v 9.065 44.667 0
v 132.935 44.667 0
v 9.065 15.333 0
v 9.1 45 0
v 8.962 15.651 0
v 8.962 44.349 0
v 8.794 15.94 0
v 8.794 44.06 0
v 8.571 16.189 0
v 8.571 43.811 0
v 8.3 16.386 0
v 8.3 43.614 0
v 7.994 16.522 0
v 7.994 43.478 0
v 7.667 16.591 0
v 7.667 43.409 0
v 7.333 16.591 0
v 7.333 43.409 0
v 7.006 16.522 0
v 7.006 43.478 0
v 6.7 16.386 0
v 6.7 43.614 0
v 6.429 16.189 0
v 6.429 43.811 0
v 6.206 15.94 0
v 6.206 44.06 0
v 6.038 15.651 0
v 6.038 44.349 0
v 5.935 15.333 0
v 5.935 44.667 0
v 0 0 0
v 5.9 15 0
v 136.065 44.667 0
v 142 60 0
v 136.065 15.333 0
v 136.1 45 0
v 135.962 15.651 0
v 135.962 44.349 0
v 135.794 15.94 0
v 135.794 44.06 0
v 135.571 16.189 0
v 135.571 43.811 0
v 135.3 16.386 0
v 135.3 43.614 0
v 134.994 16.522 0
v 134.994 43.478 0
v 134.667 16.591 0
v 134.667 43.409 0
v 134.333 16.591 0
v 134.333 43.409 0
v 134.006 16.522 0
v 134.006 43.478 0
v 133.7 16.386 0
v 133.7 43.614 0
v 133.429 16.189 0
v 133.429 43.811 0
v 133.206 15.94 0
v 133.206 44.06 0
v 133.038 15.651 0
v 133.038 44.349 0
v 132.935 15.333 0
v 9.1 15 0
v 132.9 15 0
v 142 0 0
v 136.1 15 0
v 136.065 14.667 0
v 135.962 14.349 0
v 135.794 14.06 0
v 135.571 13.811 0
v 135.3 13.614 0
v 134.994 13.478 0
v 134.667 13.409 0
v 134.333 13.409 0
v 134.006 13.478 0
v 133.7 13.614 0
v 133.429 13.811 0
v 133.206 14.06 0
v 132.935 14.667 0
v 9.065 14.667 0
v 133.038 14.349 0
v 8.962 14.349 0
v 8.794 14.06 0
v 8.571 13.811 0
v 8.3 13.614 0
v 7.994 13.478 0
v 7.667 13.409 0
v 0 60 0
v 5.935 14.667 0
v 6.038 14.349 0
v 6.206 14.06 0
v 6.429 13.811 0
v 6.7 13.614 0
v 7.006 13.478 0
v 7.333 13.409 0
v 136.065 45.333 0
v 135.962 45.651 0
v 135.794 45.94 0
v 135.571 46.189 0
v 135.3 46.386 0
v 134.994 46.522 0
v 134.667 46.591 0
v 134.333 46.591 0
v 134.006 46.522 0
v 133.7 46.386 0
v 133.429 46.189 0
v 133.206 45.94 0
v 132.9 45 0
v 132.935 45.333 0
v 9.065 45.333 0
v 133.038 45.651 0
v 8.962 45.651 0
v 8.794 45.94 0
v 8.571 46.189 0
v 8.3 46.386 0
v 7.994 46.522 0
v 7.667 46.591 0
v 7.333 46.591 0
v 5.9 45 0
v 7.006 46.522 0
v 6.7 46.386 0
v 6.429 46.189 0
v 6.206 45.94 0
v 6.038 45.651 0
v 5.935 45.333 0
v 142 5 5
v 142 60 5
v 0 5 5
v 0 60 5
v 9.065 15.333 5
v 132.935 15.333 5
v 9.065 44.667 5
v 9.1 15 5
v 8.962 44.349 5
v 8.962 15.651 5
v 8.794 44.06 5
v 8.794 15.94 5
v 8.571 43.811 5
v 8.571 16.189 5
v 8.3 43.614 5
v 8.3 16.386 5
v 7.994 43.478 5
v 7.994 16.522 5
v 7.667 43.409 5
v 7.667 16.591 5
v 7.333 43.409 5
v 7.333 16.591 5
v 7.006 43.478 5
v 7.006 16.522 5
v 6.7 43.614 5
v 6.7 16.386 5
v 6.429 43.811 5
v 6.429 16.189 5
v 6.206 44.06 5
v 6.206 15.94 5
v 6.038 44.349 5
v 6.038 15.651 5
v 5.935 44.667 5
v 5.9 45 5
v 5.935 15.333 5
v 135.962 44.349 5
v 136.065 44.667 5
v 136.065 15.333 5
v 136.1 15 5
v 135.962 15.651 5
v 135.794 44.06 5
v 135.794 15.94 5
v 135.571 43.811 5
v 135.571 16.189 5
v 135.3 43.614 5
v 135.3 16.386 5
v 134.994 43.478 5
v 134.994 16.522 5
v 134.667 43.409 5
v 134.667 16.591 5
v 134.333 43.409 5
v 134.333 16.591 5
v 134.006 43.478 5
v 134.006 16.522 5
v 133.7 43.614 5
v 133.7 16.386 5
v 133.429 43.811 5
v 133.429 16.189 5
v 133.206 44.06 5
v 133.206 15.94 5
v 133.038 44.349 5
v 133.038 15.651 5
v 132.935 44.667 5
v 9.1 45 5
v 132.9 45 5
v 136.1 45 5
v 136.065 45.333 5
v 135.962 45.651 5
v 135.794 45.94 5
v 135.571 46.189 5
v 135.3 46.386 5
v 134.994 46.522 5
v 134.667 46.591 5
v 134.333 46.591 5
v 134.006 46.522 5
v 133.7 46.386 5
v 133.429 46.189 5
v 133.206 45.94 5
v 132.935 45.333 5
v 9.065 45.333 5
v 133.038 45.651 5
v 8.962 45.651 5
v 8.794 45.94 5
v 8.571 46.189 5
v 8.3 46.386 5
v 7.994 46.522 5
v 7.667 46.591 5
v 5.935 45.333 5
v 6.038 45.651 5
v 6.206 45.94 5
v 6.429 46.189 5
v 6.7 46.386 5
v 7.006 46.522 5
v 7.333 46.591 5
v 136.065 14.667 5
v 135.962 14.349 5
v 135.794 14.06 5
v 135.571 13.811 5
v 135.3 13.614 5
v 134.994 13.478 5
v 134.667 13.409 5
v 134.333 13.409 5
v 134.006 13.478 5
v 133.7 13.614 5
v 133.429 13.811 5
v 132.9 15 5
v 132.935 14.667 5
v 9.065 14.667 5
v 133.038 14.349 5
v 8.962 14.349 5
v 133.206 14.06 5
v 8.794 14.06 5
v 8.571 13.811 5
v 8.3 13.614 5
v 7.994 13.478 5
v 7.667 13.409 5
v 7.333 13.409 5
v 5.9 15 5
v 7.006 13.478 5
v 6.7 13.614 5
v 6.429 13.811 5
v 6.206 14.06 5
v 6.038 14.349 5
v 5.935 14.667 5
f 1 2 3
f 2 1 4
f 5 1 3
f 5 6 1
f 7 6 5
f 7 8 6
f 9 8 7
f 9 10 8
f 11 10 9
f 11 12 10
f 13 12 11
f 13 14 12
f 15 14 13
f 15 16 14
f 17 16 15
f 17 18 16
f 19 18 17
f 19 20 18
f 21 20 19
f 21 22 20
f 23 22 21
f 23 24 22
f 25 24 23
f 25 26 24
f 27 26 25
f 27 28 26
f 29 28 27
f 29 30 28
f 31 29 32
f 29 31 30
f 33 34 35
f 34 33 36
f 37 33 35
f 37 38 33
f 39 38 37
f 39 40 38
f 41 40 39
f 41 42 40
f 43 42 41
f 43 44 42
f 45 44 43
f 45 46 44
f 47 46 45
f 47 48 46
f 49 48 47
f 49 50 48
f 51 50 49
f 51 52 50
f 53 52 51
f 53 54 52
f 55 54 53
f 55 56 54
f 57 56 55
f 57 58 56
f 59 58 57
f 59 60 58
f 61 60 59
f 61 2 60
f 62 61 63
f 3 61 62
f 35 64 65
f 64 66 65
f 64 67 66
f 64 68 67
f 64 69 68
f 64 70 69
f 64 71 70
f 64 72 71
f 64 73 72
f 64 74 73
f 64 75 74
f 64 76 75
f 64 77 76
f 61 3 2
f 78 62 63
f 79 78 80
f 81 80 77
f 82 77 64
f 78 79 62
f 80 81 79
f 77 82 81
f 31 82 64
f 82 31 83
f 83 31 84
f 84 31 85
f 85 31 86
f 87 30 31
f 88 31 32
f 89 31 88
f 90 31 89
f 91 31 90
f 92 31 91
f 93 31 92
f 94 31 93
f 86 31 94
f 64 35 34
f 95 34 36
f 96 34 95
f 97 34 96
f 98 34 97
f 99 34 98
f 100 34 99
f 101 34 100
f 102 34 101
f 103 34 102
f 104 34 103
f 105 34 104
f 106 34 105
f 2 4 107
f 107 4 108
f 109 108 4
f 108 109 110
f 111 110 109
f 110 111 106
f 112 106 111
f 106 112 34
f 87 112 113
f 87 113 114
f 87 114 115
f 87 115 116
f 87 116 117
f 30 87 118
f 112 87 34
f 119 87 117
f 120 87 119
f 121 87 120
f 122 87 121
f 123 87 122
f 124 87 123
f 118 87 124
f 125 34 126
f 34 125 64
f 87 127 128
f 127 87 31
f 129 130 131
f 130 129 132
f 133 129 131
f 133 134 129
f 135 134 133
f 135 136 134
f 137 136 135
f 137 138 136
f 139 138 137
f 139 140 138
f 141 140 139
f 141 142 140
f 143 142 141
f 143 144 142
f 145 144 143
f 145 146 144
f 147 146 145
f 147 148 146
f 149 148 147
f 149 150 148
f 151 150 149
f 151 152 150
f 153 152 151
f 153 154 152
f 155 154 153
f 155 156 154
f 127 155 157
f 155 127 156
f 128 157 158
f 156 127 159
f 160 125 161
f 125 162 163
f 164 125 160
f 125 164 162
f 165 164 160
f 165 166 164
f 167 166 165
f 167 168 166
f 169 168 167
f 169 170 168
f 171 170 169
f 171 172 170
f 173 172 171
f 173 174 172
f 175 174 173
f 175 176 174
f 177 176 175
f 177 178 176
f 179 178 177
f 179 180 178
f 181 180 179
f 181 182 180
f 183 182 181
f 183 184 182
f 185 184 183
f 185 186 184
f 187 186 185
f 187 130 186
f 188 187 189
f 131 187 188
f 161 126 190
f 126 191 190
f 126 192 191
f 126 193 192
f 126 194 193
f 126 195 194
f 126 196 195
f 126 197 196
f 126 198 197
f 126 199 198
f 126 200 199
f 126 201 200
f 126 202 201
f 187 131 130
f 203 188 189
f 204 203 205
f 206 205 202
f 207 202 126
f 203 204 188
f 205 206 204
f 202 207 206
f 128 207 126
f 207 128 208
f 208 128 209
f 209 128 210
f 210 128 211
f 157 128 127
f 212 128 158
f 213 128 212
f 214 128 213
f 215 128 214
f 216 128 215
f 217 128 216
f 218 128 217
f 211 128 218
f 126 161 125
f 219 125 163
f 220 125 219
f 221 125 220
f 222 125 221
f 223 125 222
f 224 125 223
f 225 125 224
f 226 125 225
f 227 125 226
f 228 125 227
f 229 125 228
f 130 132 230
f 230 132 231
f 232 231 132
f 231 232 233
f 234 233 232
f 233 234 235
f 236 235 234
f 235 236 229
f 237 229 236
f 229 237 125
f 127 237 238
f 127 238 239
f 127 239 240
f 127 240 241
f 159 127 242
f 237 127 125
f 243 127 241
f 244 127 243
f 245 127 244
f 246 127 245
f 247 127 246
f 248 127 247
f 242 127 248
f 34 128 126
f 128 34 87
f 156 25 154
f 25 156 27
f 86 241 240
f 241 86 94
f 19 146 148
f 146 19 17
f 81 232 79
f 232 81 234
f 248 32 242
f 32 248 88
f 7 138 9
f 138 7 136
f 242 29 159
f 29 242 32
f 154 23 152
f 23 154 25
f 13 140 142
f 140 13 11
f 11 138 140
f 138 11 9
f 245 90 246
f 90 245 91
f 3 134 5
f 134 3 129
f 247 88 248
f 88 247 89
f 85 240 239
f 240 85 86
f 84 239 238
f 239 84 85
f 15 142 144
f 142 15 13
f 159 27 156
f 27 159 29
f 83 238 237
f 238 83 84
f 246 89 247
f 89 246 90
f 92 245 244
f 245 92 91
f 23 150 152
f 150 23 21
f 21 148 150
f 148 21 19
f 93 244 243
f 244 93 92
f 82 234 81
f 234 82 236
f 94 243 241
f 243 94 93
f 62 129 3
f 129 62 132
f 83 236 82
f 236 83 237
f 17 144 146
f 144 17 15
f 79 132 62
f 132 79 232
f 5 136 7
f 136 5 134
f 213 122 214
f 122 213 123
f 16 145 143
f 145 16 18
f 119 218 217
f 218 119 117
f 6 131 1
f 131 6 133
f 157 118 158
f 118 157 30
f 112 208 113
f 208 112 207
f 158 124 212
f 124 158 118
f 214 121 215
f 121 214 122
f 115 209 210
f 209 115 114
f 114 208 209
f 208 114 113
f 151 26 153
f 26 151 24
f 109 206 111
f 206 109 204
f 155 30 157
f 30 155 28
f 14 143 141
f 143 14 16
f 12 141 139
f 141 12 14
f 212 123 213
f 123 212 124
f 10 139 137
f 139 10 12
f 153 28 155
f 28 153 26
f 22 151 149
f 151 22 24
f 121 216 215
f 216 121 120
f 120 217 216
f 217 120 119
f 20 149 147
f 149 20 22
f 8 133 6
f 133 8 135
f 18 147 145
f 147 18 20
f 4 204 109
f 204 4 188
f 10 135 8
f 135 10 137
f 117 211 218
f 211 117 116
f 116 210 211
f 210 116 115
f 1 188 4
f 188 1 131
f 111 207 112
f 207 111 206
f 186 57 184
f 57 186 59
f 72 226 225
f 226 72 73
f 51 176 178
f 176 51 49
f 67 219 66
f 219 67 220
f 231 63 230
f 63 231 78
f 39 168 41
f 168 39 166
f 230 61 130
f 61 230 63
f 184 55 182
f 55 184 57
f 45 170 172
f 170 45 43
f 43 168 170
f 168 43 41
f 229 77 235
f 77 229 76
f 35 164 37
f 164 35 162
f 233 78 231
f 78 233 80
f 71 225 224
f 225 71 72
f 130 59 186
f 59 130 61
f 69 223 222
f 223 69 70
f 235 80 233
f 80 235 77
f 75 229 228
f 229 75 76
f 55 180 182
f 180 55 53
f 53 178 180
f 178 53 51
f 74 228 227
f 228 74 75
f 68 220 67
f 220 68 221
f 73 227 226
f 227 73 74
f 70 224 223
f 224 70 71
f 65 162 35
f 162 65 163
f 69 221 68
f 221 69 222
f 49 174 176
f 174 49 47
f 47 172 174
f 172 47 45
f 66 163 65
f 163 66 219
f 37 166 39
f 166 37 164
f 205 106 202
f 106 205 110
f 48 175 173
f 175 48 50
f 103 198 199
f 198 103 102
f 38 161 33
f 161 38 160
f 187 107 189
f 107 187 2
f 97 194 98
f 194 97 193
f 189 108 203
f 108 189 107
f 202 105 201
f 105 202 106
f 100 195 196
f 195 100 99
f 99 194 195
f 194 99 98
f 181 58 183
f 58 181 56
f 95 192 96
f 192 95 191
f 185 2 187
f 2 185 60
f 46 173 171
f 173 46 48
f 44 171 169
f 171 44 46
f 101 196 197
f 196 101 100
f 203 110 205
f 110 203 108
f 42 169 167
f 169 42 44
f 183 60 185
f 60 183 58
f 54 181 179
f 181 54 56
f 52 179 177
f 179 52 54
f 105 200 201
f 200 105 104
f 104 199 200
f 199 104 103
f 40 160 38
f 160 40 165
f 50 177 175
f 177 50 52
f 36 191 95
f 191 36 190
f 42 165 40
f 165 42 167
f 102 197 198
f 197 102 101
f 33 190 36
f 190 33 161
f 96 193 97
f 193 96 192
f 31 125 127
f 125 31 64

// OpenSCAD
$fn=30;
translate([0,0,-25])rotate([0,90,0])
difference(){
translate([-30,0,0])cube([5,60,142]);
translate([-31,15,7.5])
rotate([0,90,0])cylinder(d=3.2,h=12);
translate([-31,45,7.5])
rotate([0,90,0])cylinder(d=3.2,h=12);
translate([-31,15,142-7.5])
rotate([0,90,0])cylinder(d=3.2,h=12);
translate([-31,45,142-7.5])
rotate([0,90,0])cylinder(d=3.2,h=12);
translate([-30,0,0])cylinder(d=10,h=142,$fn=4);
}
